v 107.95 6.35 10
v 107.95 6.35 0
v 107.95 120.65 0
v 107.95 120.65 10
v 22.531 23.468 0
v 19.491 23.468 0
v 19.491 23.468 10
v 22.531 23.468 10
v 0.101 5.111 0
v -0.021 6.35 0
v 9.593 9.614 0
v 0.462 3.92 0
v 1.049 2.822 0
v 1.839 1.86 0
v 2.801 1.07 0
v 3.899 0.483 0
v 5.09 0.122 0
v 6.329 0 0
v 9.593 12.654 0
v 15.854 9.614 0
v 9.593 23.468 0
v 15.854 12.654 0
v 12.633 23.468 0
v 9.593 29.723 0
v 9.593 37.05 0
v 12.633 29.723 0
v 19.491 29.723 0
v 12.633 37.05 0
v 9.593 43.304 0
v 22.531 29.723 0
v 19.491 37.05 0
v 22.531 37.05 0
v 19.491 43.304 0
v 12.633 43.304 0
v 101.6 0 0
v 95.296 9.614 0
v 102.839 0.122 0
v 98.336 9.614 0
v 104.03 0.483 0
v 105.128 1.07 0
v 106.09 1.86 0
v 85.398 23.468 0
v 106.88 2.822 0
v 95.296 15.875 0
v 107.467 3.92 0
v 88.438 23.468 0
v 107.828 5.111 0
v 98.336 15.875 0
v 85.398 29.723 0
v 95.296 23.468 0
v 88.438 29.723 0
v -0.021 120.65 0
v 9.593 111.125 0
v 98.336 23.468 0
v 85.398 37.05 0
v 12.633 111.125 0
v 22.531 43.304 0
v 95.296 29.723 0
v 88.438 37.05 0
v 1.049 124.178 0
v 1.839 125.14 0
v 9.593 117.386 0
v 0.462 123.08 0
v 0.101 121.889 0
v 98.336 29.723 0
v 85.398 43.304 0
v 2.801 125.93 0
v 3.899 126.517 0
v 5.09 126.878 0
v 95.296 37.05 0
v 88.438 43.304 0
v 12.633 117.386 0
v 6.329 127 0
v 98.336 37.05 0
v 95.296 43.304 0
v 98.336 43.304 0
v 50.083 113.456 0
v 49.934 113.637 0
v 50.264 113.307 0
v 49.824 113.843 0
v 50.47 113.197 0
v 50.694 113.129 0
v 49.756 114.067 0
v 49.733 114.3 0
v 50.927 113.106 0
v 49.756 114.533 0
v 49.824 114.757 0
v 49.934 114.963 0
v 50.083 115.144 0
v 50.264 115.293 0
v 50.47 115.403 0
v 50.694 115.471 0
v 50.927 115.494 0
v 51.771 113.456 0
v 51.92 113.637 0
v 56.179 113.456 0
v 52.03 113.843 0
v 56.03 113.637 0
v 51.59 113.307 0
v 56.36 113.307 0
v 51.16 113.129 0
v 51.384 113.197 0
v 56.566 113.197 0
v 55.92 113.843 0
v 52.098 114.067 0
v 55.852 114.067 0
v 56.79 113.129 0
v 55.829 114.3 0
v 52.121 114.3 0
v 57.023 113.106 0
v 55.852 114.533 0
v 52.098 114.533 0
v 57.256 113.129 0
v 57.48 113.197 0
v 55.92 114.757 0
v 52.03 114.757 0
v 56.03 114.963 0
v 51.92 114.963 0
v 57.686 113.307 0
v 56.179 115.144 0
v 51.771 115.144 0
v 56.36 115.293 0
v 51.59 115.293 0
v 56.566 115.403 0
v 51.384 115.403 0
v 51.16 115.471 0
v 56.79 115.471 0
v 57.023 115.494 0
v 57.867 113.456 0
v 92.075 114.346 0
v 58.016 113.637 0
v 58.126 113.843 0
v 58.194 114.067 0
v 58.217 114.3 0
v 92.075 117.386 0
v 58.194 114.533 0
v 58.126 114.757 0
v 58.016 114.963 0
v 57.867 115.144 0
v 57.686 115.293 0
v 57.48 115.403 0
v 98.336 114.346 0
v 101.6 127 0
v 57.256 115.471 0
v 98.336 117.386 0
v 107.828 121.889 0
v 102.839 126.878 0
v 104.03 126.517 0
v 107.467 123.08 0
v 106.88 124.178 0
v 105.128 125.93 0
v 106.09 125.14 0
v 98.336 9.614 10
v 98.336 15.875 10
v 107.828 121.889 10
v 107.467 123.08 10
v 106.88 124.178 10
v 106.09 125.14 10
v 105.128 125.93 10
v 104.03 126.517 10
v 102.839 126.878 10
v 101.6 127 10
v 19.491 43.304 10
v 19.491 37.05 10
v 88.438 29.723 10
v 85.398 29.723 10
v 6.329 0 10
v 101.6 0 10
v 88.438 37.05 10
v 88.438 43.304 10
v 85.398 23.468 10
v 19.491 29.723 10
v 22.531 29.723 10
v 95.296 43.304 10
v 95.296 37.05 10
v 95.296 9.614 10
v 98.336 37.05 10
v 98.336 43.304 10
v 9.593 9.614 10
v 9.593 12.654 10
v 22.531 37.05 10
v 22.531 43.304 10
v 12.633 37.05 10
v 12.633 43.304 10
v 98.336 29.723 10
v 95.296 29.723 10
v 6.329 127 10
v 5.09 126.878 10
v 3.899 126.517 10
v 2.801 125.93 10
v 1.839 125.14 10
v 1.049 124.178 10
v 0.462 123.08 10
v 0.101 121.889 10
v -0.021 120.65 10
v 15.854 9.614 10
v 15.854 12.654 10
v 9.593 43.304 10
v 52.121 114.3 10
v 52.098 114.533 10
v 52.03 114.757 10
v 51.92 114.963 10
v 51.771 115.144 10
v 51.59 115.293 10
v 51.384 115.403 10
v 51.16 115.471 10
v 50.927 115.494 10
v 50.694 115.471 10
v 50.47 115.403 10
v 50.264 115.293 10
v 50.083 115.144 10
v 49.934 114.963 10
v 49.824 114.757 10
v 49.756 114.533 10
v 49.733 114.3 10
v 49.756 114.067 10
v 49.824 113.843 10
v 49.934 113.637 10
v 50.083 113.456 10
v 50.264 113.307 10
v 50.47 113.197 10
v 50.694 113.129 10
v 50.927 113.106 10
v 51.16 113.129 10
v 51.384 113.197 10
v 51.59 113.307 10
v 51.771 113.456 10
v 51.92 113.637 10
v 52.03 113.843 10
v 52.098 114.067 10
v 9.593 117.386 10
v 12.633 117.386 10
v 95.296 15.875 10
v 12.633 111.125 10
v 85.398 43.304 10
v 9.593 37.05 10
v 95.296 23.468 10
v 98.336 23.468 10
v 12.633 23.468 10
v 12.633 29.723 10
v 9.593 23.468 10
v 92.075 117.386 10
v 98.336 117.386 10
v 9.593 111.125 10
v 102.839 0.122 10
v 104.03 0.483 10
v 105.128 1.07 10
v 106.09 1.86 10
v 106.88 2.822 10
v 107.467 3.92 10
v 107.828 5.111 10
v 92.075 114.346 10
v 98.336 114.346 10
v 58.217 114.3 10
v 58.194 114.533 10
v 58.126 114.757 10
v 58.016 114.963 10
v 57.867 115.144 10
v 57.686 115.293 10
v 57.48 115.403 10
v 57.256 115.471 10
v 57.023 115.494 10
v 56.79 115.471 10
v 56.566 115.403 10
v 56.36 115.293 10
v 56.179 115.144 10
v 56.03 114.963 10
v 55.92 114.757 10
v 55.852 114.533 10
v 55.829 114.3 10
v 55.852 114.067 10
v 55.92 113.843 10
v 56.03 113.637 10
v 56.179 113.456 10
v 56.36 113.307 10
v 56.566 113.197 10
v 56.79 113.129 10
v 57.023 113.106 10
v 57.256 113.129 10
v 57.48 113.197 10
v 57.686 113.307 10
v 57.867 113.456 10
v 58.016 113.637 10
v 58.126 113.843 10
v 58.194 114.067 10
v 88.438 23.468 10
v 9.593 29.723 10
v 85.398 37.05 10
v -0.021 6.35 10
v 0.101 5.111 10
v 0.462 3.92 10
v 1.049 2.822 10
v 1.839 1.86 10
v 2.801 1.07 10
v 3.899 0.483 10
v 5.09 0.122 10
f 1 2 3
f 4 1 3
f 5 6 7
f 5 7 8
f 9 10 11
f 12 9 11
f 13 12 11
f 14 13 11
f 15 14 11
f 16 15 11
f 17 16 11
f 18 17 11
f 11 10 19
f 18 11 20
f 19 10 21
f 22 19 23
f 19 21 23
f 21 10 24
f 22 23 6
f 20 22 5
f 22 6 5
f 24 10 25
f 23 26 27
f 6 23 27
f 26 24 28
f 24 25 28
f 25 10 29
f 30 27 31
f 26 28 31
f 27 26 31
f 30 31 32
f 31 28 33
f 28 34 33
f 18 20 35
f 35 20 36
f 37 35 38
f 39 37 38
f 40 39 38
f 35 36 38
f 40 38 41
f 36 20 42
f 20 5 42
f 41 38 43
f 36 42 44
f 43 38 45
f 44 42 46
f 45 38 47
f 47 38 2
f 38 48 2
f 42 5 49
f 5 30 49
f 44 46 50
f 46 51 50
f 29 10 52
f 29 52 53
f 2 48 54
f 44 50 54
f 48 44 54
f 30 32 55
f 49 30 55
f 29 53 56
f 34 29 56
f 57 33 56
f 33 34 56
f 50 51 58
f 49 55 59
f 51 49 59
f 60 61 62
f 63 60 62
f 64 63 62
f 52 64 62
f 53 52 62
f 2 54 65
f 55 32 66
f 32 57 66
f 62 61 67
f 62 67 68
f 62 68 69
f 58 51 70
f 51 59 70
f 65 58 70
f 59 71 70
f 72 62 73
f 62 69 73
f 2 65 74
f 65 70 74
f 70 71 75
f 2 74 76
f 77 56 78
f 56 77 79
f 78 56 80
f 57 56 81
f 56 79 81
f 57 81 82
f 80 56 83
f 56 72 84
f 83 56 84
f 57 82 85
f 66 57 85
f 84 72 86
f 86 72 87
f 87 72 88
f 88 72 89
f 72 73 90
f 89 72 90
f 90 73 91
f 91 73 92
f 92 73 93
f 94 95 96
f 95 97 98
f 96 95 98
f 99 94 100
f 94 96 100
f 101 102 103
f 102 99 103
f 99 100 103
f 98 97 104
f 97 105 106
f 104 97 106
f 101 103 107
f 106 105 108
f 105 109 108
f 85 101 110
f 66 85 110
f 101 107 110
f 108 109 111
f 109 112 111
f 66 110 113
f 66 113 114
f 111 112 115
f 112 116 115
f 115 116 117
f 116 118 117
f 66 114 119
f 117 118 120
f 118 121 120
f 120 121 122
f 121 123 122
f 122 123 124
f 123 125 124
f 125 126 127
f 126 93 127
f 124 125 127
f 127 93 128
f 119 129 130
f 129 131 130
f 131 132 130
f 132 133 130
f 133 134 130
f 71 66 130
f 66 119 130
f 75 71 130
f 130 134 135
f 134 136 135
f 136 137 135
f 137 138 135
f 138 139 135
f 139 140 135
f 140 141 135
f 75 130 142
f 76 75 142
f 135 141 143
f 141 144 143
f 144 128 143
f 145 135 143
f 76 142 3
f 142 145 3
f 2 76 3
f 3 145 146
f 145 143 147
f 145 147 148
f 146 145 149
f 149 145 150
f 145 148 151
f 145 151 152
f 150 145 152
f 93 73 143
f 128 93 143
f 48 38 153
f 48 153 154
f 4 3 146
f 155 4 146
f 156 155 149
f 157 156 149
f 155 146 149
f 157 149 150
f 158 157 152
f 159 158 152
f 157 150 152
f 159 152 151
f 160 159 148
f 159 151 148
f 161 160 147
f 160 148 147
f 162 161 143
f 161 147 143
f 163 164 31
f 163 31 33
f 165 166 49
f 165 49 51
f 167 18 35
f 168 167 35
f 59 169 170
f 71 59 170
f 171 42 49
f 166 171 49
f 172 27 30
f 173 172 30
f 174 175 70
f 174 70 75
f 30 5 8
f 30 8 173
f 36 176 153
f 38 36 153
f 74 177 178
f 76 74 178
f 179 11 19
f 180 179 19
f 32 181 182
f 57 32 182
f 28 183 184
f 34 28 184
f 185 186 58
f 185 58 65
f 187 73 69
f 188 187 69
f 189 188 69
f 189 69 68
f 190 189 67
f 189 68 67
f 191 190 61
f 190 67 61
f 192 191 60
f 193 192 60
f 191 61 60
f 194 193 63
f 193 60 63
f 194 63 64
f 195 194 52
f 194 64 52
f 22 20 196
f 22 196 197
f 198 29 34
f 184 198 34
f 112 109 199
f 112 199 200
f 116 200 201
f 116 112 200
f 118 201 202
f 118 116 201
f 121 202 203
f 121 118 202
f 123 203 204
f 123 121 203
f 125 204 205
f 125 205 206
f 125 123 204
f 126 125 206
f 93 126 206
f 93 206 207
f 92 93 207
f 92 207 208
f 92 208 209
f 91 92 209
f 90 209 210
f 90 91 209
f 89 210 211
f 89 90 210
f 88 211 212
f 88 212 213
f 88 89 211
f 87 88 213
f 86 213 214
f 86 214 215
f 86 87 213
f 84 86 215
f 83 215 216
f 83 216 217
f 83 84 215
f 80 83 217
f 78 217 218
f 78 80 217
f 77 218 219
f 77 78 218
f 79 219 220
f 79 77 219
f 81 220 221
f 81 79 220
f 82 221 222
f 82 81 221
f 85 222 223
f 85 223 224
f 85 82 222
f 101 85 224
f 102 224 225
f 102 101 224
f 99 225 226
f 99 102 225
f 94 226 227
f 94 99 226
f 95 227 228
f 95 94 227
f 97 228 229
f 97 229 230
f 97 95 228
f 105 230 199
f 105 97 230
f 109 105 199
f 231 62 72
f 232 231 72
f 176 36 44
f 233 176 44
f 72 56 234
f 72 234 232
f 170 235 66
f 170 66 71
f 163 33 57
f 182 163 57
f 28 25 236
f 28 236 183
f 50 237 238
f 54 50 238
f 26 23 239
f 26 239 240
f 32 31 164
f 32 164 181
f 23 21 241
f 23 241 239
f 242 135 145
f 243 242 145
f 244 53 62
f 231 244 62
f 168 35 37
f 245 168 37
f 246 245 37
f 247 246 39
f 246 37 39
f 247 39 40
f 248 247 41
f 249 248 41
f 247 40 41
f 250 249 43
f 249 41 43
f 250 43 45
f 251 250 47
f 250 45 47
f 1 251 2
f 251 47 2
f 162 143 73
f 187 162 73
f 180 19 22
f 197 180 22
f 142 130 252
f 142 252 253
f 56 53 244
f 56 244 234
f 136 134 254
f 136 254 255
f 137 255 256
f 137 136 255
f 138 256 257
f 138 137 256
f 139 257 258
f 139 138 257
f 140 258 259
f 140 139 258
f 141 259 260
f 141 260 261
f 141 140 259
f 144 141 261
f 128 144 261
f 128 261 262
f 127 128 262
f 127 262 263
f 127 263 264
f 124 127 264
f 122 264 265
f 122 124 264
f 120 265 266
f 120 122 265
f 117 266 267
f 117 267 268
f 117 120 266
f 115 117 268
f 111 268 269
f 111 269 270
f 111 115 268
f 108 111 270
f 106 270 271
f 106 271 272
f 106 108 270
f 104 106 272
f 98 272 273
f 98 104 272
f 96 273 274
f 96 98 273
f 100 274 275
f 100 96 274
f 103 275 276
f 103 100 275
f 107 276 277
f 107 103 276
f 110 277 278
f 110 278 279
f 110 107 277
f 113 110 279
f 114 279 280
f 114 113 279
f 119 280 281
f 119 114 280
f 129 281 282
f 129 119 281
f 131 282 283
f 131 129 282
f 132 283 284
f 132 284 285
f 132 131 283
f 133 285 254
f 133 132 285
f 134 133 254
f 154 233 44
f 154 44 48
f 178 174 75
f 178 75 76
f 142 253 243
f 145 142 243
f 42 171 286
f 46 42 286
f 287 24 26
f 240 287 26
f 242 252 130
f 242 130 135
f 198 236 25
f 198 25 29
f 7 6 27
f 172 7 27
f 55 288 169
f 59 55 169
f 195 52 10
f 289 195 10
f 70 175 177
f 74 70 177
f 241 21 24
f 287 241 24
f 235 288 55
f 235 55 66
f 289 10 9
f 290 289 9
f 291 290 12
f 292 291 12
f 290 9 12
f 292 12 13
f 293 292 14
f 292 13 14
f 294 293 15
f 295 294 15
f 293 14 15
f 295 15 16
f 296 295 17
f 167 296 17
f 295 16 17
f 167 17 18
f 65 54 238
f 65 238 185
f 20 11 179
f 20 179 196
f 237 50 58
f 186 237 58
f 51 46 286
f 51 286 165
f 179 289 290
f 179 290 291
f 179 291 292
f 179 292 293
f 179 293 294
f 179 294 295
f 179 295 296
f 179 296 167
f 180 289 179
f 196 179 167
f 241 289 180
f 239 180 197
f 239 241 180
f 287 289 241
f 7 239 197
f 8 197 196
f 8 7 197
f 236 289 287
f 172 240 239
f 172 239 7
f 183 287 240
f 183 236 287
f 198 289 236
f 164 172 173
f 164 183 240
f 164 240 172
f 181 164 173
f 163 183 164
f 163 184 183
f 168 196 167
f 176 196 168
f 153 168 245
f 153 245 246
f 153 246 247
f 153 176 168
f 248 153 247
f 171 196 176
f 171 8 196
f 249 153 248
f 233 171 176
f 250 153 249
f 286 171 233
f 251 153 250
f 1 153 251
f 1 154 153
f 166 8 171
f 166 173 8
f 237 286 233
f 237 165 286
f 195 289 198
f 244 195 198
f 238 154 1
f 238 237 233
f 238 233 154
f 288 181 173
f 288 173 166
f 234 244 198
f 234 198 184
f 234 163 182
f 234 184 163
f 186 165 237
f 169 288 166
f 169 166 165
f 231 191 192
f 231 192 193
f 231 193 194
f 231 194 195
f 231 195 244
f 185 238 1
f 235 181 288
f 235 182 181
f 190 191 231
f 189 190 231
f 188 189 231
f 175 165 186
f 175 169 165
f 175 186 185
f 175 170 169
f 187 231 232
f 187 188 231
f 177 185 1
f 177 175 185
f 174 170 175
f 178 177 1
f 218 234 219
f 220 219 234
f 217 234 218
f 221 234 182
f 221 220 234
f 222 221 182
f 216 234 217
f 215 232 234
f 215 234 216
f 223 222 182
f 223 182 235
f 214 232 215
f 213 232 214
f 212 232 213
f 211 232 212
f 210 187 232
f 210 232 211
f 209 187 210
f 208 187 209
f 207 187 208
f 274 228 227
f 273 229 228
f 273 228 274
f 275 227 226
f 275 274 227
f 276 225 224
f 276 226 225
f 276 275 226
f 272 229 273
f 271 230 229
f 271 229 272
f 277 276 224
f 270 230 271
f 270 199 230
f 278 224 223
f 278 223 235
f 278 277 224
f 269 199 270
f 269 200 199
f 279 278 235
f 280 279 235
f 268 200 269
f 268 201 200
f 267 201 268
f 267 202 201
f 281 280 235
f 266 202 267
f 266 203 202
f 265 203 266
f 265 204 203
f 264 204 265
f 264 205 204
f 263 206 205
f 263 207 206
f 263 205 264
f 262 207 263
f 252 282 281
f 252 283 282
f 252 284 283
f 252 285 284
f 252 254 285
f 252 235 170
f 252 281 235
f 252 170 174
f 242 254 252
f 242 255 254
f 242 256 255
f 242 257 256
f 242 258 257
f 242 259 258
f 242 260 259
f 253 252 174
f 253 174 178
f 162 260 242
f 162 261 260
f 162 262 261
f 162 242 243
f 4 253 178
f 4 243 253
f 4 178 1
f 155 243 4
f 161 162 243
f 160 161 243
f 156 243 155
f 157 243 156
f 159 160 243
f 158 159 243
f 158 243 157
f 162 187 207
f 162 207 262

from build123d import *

# Parameters (mm, degrees)
SKETCH1_R           = 1.1938
SKETCH1_W           = 6.2611
SKETCH1_H           = 3.04
SKETCH1_W_2         = 3.04
SKETCH1_H_2         = 6.2611
SKETCH1_H_3         = 6.2541
BOSS_EXTRUDE1_DEPTH = 10


with BuildPart() as part:
    # Sketch1 → Boss-Extrude1 (new body)
    with BuildSketch(Plane.XY):
        with BuildLine():
            Line((-0.021357312, 120.65), (-0.021357312, 6.35000179))
            ThreePointArc((-0.021357312, 6.35000179), (1.838514627, 1.85987373), (6.328642688, 1.79e-06))
            Line((6.328642688, 1.79e-06), (101.6, 1.79e-06))
            ThreePointArc((101.6, 1.79e-06), (106.090128061, 1.85987373), (107.95, 6.35000179))
            Line((107.95, 6.35000179), (107.95, 120.65))
            ThreePointArc((107.95, 120.65), (106.090128061, 125.140128061), (101.6, 127))
            Line((101.6, 127), (6.328642688, 127))
            ThreePointArc((6.328642688, 127), (1.838514627, 125.140128061), (-0.021357312, 120.65))
        make_face()
        with Locations((50.927, 114.3)):
            Circle(SKETCH1_R, mode=Mode.SUBTRACT)
        with Locations((57.023, 114.3)):
            Circle(SKETCH1_R, mode=Mode.SUBTRACT)
        with Locations((12.723092688, 11.1339)):
            Rectangle(SKETCH1_W, SKETCH1_H, mode=Mode.SUBTRACT)
        with Locations((95.20555, 115.86610179)):
            Rectangle(SKETCH1_W, SKETCH1_H, mode=Mode.SUBTRACT)
        with Locations((11.112542688, 114.25555179)):
            Rectangle(SKETCH1_W_2, SKETCH1_H_2, mode=Mode.SUBTRACT)
        with Locations((11.112542688, 26.59548464)):
            Rectangle(SKETCH1_W_2, SKETCH1_H_3, mode=Mode.SUBTRACT)
        with Locations((96.8161, 26.59548464)):
            Rectangle(SKETCH1_W_2, SKETCH1_H_3, mode=Mode.SUBTRACT)
        with Locations((11.112542688, 40.17738464)):
            Rectangle(SKETCH1_W_2, SKETCH1_H_3, mode=Mode.SUBTRACT)
        with Locations((96.8161, 12.74445)):
            Rectangle(SKETCH1_W_2, SKETCH1_H_2, mode=Mode.SUBTRACT)
        with Locations((96.8161, 40.17738464)):
            Rectangle(SKETCH1_W_2, SKETCH1_H_3, mode=Mode.SUBTRACT)
        with Locations((21.010542688, 26.59548464)):
            Rectangle(SKETCH1_W_2, SKETCH1_H_3, mode=Mode.SUBTRACT)
        with Locations((21.010542688, 40.17738464)):
            Rectangle(SKETCH1_W_2, SKETCH1_H_3, mode=Mode.SUBTRACT)
        with Locations((86.9181, 26.59548464)):
            Rectangle(SKETCH1_W_2, SKETCH1_H_3, mode=Mode.SUBTRACT)
        with Locations((86.9181, 40.17738464)):
            Rectangle(SKETCH1_W_2, SKETCH1_H_3, mode=Mode.SUBTRACT)
    extrude(amount=BOSS_EXTRUDE1_DEPTH)


solid = part.part
